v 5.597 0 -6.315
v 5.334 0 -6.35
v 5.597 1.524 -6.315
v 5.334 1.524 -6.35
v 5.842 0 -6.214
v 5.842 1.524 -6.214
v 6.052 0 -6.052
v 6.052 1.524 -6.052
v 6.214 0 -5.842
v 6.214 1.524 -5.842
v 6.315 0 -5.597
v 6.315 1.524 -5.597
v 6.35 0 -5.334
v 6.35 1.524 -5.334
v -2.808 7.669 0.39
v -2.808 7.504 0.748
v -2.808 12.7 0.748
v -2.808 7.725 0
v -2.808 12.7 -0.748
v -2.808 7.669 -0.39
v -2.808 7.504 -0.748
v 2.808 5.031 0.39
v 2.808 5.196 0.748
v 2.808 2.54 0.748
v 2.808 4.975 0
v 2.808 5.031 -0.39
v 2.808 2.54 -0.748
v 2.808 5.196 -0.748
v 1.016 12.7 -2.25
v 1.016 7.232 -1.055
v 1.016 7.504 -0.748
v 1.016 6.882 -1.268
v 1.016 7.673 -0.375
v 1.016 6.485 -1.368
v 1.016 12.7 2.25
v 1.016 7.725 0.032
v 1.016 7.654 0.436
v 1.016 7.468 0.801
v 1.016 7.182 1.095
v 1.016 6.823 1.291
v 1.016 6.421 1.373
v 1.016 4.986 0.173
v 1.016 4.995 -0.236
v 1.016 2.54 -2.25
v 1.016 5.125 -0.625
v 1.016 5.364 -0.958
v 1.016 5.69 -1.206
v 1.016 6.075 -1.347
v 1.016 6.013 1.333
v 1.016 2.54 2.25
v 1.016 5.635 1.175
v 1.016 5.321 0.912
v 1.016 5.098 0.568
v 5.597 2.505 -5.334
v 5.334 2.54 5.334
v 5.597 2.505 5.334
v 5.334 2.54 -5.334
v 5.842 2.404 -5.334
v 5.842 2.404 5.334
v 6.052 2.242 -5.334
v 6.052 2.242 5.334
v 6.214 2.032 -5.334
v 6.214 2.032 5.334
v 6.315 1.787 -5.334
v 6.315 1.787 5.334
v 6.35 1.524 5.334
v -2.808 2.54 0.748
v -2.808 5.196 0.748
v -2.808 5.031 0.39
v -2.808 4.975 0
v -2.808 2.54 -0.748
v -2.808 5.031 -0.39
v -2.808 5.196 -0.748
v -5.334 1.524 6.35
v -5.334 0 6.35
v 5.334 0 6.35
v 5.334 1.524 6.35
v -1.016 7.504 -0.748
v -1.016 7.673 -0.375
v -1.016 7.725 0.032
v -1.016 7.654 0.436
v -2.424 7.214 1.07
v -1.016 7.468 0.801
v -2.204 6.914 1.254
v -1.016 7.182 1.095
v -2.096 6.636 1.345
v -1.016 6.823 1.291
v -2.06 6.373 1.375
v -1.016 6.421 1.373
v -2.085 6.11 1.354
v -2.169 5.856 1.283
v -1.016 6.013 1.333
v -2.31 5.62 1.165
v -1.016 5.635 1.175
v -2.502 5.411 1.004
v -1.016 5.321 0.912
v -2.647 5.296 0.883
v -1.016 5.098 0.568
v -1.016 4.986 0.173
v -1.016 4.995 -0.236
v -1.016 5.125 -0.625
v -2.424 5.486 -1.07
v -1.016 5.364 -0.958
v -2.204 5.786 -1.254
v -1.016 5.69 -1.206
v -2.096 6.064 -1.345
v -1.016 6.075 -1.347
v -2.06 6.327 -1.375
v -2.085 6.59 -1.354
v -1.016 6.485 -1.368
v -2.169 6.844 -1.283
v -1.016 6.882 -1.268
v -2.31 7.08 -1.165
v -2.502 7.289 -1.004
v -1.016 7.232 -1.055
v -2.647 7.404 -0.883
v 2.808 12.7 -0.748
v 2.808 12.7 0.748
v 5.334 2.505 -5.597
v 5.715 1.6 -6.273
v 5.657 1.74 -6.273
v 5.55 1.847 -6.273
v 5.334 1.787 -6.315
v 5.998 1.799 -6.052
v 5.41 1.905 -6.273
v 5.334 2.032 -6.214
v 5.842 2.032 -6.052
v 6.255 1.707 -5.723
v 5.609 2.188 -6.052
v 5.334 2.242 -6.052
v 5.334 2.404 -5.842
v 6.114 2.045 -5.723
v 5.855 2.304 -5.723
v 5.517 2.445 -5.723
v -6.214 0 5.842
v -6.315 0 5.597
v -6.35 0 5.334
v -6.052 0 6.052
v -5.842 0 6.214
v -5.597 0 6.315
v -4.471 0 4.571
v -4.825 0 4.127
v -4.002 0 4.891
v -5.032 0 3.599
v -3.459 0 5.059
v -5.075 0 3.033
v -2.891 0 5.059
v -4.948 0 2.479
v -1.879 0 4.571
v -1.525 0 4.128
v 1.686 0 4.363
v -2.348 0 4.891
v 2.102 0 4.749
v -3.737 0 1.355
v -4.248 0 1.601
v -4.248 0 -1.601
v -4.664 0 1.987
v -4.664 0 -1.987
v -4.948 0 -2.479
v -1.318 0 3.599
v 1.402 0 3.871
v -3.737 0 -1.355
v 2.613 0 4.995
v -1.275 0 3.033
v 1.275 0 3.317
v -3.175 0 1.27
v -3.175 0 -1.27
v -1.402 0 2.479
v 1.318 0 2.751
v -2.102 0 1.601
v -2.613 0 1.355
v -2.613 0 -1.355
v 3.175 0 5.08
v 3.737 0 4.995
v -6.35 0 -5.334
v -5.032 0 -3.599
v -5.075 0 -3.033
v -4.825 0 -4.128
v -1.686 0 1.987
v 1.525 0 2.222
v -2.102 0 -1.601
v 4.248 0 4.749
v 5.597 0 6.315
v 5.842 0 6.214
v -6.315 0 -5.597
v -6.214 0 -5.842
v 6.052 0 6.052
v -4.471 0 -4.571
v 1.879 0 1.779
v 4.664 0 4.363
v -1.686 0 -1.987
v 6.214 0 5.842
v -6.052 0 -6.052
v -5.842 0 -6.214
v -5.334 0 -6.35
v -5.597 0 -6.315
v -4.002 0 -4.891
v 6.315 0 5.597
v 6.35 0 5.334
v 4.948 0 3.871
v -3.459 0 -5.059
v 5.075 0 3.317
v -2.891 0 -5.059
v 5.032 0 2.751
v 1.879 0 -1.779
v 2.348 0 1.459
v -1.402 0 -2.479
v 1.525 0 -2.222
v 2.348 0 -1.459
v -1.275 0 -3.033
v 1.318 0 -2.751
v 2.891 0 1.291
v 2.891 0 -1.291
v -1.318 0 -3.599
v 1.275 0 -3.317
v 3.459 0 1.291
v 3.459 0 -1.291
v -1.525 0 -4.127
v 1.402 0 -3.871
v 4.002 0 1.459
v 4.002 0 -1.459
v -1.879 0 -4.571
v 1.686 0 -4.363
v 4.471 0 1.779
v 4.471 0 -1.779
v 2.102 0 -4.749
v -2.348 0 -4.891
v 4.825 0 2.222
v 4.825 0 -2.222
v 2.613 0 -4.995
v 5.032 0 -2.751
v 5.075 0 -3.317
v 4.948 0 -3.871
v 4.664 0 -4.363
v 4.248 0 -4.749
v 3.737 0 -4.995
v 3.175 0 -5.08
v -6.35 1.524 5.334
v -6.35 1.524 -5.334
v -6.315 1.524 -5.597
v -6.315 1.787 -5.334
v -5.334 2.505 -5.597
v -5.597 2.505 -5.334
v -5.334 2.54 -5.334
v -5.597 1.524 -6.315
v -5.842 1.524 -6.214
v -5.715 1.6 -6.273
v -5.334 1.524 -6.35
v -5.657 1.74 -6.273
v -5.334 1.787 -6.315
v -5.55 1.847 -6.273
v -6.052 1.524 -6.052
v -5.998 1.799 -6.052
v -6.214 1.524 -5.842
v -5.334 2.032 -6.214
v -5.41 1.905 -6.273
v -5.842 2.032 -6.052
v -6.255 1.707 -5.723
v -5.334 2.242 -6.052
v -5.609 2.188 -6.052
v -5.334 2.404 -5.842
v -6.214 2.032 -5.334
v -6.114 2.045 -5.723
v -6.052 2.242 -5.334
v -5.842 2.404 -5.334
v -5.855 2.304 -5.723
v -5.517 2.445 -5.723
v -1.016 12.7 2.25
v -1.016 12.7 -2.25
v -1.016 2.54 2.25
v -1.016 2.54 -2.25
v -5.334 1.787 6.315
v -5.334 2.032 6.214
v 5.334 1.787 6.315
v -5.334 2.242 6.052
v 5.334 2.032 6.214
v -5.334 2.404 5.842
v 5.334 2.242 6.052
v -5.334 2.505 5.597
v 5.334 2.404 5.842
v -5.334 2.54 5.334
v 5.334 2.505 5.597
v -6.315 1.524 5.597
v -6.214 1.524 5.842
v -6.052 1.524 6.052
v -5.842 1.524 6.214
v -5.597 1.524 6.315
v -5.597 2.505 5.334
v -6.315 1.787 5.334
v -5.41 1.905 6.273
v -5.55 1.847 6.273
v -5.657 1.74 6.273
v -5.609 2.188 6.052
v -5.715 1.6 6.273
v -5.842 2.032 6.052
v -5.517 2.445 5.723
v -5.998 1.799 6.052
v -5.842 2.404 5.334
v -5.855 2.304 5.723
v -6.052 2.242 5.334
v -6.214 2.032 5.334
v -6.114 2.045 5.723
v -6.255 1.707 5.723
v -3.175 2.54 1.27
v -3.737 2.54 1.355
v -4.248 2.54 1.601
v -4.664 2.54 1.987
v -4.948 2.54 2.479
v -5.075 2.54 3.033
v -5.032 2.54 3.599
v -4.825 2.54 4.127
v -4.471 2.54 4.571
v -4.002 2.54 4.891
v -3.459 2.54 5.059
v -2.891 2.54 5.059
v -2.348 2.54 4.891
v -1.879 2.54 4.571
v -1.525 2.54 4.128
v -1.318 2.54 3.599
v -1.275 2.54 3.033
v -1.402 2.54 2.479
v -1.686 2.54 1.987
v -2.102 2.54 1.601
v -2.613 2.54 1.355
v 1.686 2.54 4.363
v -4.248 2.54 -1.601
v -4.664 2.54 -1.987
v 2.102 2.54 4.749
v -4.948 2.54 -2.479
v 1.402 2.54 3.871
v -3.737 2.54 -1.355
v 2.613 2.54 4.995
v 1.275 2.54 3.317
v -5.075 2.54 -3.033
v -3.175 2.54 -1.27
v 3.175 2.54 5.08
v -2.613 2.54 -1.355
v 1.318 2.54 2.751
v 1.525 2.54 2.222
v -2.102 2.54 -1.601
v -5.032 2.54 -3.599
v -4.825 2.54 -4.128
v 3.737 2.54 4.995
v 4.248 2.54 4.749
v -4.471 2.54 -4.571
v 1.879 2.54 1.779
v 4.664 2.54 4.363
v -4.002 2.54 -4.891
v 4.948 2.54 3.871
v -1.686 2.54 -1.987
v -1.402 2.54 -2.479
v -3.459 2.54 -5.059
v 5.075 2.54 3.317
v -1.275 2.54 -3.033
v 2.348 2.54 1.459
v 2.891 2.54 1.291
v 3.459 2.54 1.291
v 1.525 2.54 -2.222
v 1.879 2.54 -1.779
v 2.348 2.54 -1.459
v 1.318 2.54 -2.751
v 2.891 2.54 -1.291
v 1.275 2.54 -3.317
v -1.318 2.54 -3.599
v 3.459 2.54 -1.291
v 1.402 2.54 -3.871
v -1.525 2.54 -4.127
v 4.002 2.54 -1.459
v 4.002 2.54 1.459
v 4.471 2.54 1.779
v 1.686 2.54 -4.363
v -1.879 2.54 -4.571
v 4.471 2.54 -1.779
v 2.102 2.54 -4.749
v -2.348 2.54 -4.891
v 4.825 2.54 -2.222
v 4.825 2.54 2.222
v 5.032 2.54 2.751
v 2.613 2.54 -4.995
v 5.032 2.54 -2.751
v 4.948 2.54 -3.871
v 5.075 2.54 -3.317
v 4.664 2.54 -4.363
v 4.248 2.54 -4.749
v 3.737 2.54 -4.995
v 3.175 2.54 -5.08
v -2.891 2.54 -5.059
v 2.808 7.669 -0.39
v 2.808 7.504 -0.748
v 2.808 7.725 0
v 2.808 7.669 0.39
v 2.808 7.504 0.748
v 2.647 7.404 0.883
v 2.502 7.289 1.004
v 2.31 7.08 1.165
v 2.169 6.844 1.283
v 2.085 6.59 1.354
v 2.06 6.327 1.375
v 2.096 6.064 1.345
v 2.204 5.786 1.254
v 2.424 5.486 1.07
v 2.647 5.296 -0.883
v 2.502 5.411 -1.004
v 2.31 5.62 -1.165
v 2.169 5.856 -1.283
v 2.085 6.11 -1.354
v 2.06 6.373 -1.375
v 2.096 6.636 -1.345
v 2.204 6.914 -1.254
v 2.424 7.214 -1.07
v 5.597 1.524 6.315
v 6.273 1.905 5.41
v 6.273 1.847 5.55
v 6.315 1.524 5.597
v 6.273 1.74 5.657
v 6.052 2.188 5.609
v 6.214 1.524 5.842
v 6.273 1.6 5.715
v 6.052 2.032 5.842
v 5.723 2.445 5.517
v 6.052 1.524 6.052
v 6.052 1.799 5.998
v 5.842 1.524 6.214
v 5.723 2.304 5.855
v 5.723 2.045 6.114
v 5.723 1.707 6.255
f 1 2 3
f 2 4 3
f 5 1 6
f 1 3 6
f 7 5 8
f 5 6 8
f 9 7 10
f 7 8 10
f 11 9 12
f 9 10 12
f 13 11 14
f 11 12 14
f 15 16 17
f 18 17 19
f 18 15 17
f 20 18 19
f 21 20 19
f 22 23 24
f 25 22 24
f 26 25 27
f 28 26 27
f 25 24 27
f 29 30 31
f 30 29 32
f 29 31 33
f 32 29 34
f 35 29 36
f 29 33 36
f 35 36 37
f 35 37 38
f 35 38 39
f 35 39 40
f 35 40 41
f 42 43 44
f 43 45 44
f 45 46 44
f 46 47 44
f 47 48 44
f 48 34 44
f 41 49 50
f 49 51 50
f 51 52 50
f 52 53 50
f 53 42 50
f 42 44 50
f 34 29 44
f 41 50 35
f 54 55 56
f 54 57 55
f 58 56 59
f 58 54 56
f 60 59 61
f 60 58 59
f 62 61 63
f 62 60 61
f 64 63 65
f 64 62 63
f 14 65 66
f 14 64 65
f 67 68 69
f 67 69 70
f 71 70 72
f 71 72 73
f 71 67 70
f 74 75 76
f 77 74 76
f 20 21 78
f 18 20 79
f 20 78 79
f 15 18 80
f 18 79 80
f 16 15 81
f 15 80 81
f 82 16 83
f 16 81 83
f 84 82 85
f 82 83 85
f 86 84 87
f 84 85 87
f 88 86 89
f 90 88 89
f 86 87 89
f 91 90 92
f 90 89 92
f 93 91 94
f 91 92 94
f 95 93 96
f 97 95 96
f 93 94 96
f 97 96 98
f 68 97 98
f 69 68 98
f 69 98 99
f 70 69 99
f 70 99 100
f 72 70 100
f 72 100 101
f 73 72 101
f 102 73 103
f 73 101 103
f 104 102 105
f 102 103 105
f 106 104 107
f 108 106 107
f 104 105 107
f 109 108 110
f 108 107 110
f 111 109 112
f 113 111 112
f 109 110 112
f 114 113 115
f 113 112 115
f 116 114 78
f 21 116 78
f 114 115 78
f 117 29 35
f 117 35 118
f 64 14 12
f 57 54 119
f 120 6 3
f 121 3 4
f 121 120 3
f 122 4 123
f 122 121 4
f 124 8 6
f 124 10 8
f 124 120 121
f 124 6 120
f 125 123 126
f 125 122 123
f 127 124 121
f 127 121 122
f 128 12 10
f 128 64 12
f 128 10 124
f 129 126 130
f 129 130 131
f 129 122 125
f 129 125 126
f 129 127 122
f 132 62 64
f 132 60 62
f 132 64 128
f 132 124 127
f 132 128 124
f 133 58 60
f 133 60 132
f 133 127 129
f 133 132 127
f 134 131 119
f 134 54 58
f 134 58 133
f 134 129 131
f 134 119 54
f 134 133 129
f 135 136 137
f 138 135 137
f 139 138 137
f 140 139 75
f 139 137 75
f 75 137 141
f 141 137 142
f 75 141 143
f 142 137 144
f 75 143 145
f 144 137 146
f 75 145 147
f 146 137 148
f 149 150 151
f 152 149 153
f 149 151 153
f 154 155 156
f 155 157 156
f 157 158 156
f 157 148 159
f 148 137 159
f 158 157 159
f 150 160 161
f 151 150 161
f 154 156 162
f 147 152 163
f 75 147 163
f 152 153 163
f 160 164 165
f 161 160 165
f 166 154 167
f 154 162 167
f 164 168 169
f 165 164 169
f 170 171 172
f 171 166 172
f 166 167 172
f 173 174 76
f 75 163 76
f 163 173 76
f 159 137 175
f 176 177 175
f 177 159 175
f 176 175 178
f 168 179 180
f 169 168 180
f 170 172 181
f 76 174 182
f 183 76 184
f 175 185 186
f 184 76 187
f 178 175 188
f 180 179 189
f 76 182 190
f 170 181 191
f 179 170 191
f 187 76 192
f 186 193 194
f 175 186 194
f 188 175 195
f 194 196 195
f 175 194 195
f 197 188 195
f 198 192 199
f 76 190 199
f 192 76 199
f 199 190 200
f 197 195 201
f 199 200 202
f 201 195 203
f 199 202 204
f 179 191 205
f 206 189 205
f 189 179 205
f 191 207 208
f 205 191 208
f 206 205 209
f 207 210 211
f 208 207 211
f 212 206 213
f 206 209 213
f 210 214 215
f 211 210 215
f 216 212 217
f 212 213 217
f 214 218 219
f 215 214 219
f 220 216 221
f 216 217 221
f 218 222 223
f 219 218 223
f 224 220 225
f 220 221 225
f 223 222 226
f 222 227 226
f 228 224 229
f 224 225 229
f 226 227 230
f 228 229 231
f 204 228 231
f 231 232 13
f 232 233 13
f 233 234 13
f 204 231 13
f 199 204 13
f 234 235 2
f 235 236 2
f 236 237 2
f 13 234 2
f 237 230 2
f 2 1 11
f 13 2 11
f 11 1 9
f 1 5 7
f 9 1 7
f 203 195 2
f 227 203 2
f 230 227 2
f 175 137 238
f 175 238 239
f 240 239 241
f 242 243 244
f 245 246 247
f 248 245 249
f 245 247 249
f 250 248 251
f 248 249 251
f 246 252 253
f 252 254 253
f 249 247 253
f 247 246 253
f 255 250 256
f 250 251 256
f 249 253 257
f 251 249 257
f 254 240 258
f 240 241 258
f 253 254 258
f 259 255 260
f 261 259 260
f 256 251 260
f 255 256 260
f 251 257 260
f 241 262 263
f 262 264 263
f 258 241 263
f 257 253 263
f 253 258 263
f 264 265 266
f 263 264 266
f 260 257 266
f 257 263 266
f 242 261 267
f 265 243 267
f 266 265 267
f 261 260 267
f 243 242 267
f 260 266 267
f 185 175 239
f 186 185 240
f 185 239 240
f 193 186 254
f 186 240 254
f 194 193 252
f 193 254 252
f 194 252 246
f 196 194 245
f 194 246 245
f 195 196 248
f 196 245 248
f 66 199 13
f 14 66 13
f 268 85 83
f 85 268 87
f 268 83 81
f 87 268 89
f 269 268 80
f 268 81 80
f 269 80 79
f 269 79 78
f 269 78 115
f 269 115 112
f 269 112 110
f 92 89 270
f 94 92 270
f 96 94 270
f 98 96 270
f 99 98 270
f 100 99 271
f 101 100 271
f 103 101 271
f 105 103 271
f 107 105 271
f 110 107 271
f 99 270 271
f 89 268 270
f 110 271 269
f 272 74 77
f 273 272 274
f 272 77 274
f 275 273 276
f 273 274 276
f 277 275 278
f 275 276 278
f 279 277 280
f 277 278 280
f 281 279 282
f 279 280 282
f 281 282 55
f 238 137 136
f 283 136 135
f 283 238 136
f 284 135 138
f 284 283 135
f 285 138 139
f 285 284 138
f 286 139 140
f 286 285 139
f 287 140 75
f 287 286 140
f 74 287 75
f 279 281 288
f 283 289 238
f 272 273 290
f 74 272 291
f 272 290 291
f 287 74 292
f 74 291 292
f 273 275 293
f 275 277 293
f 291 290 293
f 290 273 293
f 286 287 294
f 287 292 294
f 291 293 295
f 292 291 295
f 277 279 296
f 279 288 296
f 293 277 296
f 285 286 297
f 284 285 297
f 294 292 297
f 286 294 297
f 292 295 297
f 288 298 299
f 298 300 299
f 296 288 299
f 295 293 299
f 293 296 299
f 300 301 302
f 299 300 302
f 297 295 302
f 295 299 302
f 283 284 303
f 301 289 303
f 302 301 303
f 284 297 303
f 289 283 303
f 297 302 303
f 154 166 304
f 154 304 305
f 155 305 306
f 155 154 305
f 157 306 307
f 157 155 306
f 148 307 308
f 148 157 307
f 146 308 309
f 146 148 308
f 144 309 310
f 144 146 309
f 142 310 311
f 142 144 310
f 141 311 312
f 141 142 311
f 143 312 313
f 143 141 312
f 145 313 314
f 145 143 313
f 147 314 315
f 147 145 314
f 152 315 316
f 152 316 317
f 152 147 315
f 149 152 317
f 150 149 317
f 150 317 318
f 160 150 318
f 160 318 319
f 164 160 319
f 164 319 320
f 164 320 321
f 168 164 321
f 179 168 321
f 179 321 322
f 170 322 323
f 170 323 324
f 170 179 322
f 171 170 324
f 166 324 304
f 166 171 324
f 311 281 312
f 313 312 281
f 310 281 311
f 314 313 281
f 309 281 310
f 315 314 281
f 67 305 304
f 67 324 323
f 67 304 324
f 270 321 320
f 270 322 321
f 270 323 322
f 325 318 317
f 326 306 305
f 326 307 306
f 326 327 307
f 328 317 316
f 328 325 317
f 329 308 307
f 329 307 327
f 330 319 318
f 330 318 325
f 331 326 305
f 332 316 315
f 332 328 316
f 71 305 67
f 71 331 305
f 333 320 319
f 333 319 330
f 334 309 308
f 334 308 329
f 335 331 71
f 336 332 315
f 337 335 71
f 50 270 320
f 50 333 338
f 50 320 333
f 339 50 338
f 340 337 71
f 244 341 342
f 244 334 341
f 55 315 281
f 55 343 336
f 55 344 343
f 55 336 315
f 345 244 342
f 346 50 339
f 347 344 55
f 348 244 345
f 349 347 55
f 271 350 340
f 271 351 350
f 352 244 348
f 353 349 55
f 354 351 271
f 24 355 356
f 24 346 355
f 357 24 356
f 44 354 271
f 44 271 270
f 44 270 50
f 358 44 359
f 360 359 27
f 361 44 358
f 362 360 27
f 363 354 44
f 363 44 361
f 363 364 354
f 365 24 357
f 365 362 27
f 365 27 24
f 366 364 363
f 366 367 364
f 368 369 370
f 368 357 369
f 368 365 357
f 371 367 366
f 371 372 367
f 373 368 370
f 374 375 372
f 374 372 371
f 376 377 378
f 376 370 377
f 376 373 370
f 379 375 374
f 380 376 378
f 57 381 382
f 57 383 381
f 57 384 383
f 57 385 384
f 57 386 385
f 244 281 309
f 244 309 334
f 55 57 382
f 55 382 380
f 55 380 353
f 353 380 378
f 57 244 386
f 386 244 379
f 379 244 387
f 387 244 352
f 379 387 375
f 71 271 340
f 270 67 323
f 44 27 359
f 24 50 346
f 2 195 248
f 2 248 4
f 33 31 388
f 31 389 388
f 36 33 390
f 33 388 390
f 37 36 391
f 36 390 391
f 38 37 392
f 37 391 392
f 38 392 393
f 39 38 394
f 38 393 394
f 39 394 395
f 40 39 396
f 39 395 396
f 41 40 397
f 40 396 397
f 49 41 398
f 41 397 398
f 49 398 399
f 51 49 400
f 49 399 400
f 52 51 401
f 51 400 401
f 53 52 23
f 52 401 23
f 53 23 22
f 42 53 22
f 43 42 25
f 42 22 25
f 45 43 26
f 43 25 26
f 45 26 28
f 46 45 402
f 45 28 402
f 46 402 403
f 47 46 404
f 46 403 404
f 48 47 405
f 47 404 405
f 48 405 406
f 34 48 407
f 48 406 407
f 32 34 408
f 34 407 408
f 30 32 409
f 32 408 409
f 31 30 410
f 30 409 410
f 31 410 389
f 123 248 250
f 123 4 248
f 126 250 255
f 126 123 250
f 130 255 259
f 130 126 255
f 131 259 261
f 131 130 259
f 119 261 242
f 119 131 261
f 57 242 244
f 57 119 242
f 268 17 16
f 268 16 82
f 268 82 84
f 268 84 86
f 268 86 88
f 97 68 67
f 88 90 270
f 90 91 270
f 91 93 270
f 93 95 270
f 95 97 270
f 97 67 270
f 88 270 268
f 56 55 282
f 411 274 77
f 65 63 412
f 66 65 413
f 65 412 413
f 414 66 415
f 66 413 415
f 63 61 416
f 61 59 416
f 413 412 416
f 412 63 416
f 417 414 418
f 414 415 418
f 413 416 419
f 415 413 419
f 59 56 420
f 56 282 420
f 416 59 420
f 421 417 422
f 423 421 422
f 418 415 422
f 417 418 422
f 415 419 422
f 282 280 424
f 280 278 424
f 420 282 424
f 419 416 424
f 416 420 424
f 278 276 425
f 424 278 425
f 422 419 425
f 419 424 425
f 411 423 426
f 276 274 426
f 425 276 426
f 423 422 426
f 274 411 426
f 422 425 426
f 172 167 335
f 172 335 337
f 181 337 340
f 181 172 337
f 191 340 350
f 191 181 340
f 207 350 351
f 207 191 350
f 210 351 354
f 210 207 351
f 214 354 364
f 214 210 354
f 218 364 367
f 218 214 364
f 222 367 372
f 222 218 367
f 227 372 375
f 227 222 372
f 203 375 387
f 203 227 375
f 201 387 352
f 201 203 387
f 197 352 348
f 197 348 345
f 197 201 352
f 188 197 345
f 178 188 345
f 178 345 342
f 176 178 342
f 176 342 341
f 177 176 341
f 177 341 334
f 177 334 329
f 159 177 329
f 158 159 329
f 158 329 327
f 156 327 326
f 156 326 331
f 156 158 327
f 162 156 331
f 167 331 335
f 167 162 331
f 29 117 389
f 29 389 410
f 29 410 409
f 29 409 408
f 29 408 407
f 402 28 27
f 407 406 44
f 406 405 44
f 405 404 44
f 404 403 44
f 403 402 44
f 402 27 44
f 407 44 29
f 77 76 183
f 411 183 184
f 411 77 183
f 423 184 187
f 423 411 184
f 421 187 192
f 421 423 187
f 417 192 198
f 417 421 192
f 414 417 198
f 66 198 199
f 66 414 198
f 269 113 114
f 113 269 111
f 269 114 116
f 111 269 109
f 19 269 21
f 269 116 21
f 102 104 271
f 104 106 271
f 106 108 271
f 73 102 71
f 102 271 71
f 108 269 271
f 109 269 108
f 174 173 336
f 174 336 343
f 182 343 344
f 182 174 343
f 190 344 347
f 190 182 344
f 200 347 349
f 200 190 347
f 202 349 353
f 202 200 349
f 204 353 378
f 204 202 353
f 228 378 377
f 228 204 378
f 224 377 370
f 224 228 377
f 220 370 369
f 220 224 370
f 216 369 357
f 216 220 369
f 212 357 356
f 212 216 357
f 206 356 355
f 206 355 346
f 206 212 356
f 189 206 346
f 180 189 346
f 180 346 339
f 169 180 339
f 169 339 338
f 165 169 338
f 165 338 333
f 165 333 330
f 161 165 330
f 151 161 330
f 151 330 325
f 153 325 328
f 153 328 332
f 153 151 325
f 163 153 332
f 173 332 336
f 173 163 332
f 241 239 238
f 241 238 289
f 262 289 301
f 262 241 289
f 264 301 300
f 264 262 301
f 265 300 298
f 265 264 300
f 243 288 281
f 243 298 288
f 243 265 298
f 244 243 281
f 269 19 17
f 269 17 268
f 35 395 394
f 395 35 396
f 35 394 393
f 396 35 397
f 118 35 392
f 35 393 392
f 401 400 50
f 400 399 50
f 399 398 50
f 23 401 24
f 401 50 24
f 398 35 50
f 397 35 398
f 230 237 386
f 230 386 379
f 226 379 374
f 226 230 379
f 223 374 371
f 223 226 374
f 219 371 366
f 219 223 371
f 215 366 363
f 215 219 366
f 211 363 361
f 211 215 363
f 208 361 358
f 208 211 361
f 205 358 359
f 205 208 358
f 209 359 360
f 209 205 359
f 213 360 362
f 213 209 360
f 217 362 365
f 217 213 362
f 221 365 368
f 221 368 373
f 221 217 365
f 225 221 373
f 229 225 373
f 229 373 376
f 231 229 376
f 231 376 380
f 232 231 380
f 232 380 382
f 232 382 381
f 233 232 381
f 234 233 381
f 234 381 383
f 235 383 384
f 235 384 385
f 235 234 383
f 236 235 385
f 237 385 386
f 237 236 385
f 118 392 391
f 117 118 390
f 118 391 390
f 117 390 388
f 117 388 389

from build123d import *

# Parameters (mm, degrees)
SKETCH1_W           = 12.7
SKETCH1_H           = 12.7
SKETCH1_R           = 1.905
BOSS_EXTRUDE1_DEPTH = 2.54
SKETCH2_W           = 1.791864934
SKETCH2_H           = 1.49598957
BOSS_EXTRUDE2_DEPTH = 10.16
SKETCH3_R           = 1.375
CUT_EXTRUDE1_DEPTH  = 17.896123524
FILLET1_R           = 1.016


with BuildPart() as part:
    # Sketch1 → Boss-Extrude1 (new body)
    with BuildSketch(Plane(origin=(0, 0, 0), x_dir=(1, 0, 0), z_dir=(0, 1, 0))):
        Rectangle(SKETCH1_W, SKETCH1_H)
        with Locations(Location((-3.175, 3.175, 0), (0, 0, 270))):
            Circle(SKETCH1_R, mode=Mode.SUBTRACT)
        with Locations(Location((3.175, 3.175, 0), (0, 0, 90))):
            Circle(SKETCH1_R, mode=Mode.SUBTRACT)
        with Locations(Location((3.175, -3.175, 0), (0, 0, 270))):
            Circle(SKETCH1_R, mode=Mode.SUBTRACT)
        with Locations(Location((-3.175, -3.175, 0), (0, 0, 90))):
            Circle(SKETCH1_R, mode=Mode.SUBTRACT)
    extrude(amount=BOSS_EXTRUDE1_DEPTH)

    # Sketch2 → Boss-Extrude2 (add)
    with BuildSketch(Plane(origin=(0, 2.54, 0), x_dir=(1, 0, 0), z_dir=(0, 1, 0))):
        Polygon((-1.016, 0.747994785), (-1.016, 2.249760645), (-2.807864934, 0.747994785), align=None)
        with Locations((-1.911932467, 0)):
            Rectangle(SKETCH2_W, SKETCH2_H)
        Polygon((-1.016, -2.249760645), (-1.016, -0.747994785), (-2.807864934, -0.747994785), align=None)
        Polygon((2.807864934, 0.747994785), (1.016, 2.249760645), (1.016, 0.747994785), align=None)
        with Locations((1.911932467, 0)):
            Rectangle(SKETCH2_W, SKETCH2_H)
        Polygon((2.807864934, -0.747994785), (1.016, -0.747994785), (1.016, -2.249760645), align=None)
    extrude(amount=BOSS_EXTRUDE2_DEPTH)

    # Sketch3 → Cut-Extrude1 (cut, through all)
    with BuildSketch(Plane(origin=(2.807864934, 0, 0), x_dir=(0, 0, -1), z_dir=(1, 0, 0))):
        with Locations(Location((0, 6.35, 0), (0, 0, 57.043905398))):
            Circle(SKETCH3_R)
    extrude(amount=-CUT_EXTRUDE1_DEPTH, mode=Mode.SUBTRACT)

    # Fillet1
    fillet1_edges = [part.edges().sort_by_distance(p)[0] for p in [
        (-6.35, 2.54, 0),
        (0, 2.54, 6.35),
        (6.35, 2.54, 0),
        (6.35, 1.27, 6.35),
        (-6.35, 1.27, 6.35),
        (-6.35, 1.27, -6.35),
        (6.35, 1.27, -6.35),
        (0, 2.54, -6.35),
    ]]
    fillet(fillet1_edges, radius=FILLET1_R)


solid = part.part
